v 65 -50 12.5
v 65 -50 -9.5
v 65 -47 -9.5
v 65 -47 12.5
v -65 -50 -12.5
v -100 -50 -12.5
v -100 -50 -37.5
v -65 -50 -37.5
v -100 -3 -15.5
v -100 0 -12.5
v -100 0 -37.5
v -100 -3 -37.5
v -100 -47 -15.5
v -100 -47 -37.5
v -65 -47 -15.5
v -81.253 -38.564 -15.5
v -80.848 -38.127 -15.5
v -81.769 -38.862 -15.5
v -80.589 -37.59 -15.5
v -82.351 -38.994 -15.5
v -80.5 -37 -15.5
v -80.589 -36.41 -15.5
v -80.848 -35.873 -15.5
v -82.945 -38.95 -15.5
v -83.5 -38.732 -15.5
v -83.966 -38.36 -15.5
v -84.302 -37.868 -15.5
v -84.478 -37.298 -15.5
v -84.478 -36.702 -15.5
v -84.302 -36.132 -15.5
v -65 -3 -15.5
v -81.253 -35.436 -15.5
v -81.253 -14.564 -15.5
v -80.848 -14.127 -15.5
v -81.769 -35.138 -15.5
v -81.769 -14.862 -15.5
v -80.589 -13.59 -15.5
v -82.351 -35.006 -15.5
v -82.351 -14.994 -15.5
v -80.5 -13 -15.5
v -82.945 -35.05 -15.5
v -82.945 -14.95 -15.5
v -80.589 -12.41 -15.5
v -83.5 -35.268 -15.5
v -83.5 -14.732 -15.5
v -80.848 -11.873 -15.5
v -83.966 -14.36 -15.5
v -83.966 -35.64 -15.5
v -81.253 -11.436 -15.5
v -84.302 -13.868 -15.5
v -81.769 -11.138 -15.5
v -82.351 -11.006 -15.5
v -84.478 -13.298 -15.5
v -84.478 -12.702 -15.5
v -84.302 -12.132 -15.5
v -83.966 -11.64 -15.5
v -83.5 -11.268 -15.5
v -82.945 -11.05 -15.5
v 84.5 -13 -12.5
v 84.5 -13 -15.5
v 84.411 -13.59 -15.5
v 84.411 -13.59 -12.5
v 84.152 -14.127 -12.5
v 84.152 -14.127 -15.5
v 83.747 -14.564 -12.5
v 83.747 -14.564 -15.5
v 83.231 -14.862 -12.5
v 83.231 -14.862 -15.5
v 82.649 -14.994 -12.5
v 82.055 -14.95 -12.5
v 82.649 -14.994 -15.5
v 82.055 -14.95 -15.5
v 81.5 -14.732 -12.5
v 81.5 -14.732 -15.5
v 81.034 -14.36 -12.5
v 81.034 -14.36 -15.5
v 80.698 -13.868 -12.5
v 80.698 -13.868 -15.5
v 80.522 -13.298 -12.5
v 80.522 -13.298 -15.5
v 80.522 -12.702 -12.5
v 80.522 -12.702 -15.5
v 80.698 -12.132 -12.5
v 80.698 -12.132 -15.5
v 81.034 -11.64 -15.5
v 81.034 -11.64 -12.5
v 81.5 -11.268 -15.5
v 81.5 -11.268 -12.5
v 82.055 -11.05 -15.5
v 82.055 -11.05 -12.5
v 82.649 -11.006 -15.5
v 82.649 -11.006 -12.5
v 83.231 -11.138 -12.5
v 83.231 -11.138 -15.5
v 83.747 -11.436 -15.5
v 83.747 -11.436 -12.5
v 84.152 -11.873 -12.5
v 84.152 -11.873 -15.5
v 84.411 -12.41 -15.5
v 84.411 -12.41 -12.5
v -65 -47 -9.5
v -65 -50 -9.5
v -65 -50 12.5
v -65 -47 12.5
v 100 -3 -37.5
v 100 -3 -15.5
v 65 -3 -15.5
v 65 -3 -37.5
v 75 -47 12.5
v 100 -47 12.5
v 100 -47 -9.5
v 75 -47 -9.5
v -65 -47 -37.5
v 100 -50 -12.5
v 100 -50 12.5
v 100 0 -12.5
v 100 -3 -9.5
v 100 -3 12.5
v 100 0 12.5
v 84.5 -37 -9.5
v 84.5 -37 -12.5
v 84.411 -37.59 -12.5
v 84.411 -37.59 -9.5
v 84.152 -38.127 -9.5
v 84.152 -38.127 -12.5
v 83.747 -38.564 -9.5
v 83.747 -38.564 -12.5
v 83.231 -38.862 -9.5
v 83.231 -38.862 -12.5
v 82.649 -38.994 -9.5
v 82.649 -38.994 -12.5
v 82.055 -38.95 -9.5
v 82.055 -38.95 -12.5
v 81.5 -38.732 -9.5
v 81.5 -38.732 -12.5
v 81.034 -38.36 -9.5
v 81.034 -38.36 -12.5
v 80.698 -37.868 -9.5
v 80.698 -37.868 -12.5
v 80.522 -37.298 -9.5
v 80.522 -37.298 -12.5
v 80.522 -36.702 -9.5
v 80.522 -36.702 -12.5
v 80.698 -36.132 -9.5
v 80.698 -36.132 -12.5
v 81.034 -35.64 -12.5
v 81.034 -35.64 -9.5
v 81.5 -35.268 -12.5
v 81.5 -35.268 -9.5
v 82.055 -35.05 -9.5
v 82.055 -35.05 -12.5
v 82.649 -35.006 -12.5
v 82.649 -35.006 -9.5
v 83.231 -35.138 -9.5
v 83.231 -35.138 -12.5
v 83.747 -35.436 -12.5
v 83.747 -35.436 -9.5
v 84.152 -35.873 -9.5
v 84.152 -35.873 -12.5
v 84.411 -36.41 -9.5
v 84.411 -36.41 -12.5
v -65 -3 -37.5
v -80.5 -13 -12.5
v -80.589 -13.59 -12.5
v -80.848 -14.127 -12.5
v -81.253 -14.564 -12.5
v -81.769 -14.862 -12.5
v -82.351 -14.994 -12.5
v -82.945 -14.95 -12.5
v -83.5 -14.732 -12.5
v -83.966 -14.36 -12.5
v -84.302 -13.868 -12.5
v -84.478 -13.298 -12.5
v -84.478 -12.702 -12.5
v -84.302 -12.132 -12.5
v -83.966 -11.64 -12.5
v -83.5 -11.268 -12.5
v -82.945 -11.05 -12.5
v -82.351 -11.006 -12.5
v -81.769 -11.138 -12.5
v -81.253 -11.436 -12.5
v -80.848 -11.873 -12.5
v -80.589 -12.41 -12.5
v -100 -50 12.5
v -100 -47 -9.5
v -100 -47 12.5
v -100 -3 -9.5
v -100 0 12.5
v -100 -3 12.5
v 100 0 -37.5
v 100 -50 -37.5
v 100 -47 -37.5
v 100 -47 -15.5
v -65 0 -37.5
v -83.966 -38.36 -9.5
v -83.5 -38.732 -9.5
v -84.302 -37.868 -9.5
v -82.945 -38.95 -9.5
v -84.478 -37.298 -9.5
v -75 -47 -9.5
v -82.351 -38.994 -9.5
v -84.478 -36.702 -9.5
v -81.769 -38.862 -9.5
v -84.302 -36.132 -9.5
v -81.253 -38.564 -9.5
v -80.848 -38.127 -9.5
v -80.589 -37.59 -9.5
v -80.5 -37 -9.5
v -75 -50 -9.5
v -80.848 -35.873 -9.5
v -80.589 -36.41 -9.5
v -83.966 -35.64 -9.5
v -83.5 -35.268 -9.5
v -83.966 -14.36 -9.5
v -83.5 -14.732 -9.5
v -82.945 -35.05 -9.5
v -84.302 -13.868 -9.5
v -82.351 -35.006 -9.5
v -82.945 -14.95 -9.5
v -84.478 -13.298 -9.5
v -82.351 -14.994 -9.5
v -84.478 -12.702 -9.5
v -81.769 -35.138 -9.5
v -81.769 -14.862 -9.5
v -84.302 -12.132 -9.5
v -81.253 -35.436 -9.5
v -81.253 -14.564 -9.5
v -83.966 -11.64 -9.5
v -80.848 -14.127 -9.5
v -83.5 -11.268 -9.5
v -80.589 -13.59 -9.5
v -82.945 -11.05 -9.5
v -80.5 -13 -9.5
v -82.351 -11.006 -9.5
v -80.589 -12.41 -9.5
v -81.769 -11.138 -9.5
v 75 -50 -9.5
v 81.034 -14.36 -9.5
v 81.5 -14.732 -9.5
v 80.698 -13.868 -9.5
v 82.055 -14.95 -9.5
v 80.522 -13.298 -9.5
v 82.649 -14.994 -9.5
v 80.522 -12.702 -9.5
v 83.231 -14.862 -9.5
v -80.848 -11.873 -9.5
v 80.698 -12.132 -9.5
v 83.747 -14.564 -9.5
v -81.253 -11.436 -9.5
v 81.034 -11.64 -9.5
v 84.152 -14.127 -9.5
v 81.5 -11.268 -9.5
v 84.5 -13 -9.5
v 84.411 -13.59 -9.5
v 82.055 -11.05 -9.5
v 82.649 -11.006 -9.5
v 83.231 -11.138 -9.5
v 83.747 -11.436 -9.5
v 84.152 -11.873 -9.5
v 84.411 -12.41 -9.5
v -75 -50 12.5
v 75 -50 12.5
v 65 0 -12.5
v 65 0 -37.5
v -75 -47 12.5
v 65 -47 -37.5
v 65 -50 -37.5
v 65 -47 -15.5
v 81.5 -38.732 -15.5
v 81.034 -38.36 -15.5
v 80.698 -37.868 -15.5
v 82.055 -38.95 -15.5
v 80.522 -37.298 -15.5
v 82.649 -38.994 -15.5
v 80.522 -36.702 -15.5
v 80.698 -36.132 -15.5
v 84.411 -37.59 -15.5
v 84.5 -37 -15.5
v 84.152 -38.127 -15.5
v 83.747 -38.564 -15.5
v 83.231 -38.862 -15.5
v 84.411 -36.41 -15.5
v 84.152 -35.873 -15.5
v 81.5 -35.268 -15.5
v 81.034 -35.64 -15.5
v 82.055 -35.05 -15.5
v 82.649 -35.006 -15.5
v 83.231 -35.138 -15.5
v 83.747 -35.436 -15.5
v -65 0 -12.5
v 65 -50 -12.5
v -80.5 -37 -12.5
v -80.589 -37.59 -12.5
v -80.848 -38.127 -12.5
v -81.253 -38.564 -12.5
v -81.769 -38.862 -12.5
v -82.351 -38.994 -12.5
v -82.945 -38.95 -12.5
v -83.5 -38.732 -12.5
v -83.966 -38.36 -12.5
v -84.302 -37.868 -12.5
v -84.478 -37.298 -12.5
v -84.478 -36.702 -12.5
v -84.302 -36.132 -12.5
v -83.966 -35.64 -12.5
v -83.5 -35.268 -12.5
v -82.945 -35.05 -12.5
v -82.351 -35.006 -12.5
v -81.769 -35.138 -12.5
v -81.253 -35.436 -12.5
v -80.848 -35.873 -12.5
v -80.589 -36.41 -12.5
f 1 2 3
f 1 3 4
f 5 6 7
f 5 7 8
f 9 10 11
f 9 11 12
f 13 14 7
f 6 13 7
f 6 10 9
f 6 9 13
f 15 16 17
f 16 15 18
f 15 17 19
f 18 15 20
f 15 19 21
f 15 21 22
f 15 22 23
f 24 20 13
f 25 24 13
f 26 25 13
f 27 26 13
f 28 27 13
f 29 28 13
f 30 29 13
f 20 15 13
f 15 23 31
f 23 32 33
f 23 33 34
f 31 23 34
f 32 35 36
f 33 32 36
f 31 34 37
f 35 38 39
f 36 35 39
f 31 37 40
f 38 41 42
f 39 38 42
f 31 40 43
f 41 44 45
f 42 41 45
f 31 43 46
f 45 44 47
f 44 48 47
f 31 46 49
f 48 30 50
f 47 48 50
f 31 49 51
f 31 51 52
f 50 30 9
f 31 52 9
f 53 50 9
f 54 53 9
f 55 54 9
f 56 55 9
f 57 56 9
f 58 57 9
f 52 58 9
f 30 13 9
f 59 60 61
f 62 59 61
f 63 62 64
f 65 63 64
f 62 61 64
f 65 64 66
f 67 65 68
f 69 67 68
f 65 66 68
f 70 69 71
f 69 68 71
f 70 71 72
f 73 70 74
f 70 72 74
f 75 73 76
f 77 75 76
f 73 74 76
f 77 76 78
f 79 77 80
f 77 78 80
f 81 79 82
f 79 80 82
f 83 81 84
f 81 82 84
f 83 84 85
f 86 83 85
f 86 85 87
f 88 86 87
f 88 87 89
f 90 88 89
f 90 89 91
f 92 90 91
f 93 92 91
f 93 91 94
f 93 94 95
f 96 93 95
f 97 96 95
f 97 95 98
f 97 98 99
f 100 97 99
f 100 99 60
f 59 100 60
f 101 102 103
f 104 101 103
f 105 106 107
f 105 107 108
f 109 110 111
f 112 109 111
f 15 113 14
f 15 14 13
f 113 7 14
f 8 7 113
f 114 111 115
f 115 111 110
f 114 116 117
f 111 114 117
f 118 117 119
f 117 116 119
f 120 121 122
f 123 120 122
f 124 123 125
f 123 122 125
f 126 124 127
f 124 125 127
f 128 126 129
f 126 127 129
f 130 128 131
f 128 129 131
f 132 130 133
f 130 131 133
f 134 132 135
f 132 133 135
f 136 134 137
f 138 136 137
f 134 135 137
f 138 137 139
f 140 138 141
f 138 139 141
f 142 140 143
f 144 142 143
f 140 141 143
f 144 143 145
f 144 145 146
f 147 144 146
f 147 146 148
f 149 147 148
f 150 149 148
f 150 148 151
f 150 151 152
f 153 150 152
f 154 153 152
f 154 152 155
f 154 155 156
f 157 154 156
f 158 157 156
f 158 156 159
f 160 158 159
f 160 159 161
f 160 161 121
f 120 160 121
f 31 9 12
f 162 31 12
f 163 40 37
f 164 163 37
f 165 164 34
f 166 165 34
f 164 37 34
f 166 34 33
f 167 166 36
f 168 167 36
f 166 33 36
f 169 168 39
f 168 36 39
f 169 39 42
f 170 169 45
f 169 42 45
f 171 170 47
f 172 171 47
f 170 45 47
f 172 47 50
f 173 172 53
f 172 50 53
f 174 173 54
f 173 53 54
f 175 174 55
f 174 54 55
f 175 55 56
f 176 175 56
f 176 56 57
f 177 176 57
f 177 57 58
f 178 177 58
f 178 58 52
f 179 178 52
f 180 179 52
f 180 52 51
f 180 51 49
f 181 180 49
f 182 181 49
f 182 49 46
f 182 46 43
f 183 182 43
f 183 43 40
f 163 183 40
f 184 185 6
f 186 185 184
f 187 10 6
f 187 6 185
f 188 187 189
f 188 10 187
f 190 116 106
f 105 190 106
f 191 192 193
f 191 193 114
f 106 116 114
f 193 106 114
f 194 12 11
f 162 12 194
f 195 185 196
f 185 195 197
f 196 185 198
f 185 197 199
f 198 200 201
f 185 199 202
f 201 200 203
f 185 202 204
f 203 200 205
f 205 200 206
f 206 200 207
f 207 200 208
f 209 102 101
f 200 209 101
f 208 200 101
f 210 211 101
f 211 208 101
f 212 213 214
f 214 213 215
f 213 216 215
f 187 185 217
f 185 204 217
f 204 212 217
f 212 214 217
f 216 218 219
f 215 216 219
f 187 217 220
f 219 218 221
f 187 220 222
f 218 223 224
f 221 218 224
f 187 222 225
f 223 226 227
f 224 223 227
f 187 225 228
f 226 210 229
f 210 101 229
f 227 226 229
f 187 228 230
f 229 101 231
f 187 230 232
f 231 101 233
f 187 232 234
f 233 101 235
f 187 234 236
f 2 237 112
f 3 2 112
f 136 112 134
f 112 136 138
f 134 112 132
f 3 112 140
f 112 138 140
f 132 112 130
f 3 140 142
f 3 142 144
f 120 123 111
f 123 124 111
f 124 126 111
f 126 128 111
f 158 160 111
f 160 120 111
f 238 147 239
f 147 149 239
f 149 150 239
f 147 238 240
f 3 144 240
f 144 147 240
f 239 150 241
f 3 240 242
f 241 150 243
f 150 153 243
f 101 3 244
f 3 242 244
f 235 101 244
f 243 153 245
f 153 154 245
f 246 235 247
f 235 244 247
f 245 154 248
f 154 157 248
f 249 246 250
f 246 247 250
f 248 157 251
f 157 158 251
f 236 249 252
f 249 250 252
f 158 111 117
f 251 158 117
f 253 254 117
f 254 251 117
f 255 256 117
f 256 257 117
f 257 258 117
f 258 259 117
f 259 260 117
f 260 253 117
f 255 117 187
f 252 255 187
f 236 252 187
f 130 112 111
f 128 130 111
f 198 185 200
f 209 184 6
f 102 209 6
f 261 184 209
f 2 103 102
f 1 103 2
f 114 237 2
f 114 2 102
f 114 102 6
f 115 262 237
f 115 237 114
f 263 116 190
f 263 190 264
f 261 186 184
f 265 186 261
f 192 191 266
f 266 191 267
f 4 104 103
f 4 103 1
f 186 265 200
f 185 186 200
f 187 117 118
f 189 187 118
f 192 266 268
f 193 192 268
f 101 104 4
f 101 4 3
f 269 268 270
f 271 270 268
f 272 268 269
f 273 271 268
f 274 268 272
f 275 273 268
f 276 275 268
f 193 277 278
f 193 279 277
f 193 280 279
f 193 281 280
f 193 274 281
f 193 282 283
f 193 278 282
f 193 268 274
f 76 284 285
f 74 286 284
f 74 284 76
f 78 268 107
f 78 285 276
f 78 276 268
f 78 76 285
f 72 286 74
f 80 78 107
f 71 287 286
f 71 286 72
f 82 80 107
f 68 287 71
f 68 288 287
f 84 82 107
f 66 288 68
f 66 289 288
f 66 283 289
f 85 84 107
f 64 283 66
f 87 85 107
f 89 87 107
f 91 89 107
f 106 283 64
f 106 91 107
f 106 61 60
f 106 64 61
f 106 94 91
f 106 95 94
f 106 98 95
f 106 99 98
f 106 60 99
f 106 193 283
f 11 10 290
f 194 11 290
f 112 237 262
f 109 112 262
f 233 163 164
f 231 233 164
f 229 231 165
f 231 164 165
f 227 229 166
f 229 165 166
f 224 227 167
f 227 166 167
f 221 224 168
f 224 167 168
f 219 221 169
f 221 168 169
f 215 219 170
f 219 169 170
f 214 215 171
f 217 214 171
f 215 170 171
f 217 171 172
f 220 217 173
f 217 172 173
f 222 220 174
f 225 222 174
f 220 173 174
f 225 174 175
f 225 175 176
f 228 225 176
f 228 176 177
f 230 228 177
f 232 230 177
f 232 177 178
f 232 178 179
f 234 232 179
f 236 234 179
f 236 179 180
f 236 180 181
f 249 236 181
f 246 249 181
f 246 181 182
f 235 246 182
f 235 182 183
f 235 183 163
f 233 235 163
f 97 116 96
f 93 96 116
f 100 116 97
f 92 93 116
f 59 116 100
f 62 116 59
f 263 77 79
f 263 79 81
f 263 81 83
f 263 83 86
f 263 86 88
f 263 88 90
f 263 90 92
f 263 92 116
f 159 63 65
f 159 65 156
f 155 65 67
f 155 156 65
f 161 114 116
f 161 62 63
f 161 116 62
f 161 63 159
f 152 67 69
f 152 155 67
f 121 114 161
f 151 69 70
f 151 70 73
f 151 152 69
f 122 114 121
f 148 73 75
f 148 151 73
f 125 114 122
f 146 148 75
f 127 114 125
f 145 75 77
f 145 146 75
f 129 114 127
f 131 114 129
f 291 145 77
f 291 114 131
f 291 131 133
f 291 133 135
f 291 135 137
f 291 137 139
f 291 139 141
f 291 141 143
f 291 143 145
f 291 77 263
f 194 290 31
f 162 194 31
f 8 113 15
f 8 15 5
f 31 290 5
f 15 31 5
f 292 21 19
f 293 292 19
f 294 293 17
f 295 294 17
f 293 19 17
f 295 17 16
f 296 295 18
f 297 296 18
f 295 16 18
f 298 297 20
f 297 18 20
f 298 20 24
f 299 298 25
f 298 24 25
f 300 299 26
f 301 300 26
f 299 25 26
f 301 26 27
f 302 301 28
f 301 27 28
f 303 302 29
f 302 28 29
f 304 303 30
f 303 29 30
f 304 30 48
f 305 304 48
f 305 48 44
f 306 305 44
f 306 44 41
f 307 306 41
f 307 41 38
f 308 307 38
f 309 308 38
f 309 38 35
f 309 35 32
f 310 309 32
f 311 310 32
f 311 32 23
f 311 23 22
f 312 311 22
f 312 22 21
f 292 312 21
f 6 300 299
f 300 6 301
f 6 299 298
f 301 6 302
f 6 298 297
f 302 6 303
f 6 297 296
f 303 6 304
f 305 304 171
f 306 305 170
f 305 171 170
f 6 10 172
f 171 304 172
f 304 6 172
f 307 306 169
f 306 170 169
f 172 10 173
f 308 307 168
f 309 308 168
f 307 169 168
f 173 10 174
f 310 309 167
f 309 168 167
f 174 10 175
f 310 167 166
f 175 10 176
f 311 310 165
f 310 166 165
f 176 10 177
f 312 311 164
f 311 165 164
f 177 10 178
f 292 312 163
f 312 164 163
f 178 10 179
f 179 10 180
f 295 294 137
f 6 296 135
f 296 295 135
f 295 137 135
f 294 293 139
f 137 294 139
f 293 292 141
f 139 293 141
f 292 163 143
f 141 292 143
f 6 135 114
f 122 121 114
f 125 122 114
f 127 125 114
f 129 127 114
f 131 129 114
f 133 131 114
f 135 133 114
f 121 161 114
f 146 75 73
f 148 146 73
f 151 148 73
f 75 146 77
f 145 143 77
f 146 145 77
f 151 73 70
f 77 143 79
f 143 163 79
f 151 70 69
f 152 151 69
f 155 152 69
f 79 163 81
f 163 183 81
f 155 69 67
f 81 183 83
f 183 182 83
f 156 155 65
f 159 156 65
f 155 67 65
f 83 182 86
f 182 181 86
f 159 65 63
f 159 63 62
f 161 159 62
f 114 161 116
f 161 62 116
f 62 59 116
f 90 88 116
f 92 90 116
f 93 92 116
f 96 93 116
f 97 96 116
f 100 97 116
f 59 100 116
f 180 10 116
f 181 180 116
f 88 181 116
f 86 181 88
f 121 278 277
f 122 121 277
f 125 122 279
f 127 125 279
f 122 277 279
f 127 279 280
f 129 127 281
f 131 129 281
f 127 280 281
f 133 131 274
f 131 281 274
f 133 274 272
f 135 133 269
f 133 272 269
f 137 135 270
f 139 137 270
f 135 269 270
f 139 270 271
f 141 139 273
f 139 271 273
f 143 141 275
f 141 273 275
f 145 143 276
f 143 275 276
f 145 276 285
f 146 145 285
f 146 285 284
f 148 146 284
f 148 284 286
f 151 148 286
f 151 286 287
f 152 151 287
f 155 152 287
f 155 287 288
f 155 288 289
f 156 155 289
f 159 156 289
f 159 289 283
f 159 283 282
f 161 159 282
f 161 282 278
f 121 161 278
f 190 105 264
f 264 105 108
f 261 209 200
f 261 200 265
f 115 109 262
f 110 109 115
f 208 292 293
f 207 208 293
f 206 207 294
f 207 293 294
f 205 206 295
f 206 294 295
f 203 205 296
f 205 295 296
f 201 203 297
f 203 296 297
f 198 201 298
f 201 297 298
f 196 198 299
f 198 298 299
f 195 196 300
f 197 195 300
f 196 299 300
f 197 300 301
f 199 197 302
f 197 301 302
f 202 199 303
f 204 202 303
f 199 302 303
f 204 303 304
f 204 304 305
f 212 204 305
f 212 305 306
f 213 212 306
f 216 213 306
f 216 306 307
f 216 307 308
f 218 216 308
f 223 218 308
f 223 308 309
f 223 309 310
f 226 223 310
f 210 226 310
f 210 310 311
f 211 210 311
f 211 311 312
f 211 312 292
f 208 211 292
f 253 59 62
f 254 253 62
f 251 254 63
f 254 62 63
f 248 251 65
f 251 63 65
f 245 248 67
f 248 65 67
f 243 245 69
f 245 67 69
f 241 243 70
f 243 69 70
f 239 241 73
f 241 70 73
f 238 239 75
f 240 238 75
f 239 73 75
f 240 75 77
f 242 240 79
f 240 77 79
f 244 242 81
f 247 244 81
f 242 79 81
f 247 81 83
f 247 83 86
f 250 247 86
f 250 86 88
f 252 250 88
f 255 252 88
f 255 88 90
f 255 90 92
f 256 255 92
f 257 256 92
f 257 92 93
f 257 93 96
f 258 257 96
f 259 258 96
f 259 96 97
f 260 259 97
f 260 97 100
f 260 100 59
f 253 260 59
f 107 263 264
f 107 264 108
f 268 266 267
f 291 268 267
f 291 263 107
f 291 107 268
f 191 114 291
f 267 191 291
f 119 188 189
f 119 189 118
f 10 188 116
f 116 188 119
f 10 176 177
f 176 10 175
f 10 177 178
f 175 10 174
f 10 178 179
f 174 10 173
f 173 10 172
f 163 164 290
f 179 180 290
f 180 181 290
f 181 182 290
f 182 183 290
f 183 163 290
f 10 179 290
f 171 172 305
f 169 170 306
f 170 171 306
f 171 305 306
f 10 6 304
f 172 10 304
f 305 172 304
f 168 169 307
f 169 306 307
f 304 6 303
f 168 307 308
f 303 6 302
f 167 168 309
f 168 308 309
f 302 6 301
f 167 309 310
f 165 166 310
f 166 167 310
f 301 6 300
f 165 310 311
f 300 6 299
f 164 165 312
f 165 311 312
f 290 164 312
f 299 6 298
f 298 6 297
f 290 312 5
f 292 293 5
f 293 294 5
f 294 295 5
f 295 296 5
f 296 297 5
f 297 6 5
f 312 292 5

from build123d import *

# Parameters (mm, degrees)
F0_W      = 200
F0_H      = 25
F1_DEPTH  = 50
F3_DEPTH  = 200.001
F4_W      = 10
F4_H      = 22
F5_DEPTH  = 47
F6_W      = 35
F6_H      = 50
F7_DEPTH  = 25
F9_DEPTH  = 200.001
F11_R     = 2
F12_DEPTH = 28.001


with BuildPart() as f1:
    # F0 (on Front) → F1 (new body)
    with BuildSketch(Plane.XZ):
        Rectangle(F0_W, F0_H)
    extrude(amount=F1_DEPTH)

    # F2 (on face) → F3 (cut, through all)
    with BuildSketch(Plane.YZ.offset(100)):
        Polygon((-3, 12.5), (-47, 12.5), (-47, 4.398307), (-47, -9.5), (-23.419829, -9.5), (-3, -9.5), (-3, 6.889603), align=None)
    extrude(amount=-F3_DEPTH, mode=Mode.SUBTRACT)

    # F4 (on face) → F5 (cut, through all)
    with BuildSketch(Plane.XZ.offset(50)):
        with Locations((-70, 1.5)):
            Rectangle(F4_W, F4_H)
        with Locations((70, 1.5)):
            Rectangle(F4_W, F4_H)
    extrude(amount=-F5_DEPTH, mode=Mode.SUBTRACT)


with BuildPart() as f7:
    # F6 (on face) → F7 (new body)
    with BuildSketch(Plane(origin=(0, 0, -12.5), x_dir=(1, 0, 0), z_dir=(0, 0, -1))):
        with Locations((-82.5, 25)):
            Rectangle(F6_W, F6_H)
    extrude(amount=F7_DEPTH)

    # F8 (on face) → F9 (cut, through all)
    with BuildSketch(Plane(origin=(-100, 0, 0), x_dir=(0, -1, 0), z_dir=(-1, 0, 0))):
        Polygon((3, -25.254963), (3, -37.5), (47, -37.5), (47, -24.68876), (47, -15.5), (22.2564, -15.5), (3, -15.5), align=None)
    extrude(amount=-F9_DEPTH, mode=Mode.SUBTRACT)


with BuildPart() as f10_1:
    # F10: instance of F7
    add(f7.part.mirror(Plane.YZ))


with BuildPart() as f12_tool:
    # F11 (on face) → F12 (new body, through all)
    with BuildSketch(Plane(origin=(0, 0, -15.5), x_dir=(1, 0, 0), z_dir=(0, 0, -1))):
        with Locations((-82.5, 37)):
            Circle(F11_R)
        with Locations((-82.5, 13)):
            Circle(F11_R)
        with Locations((82.5, 13)):
            Circle(F11_R)
        with Locations((82.5, 37)):
            Circle(F11_R)
    extrude(amount=-F12_DEPTH)


with BuildPart() as f1_1:
    add(f1.part)

    # F12: cut by f12_tool
    add(f12_tool.part, mode=Mode.SUBTRACT)


with BuildPart() as f7_1:
    add(f7.part)

    # F12: cut by f12_tool
    add(f12_tool.part, mode=Mode.SUBTRACT)


with BuildPart() as f10_1_1:
    add(f10_1.part)

    # F12: cut by f12_tool
    add(f12_tool.part, mode=Mode.SUBTRACT)


solid = Compound([f1_1.part, f7_1.part, f10_1_1.part])
